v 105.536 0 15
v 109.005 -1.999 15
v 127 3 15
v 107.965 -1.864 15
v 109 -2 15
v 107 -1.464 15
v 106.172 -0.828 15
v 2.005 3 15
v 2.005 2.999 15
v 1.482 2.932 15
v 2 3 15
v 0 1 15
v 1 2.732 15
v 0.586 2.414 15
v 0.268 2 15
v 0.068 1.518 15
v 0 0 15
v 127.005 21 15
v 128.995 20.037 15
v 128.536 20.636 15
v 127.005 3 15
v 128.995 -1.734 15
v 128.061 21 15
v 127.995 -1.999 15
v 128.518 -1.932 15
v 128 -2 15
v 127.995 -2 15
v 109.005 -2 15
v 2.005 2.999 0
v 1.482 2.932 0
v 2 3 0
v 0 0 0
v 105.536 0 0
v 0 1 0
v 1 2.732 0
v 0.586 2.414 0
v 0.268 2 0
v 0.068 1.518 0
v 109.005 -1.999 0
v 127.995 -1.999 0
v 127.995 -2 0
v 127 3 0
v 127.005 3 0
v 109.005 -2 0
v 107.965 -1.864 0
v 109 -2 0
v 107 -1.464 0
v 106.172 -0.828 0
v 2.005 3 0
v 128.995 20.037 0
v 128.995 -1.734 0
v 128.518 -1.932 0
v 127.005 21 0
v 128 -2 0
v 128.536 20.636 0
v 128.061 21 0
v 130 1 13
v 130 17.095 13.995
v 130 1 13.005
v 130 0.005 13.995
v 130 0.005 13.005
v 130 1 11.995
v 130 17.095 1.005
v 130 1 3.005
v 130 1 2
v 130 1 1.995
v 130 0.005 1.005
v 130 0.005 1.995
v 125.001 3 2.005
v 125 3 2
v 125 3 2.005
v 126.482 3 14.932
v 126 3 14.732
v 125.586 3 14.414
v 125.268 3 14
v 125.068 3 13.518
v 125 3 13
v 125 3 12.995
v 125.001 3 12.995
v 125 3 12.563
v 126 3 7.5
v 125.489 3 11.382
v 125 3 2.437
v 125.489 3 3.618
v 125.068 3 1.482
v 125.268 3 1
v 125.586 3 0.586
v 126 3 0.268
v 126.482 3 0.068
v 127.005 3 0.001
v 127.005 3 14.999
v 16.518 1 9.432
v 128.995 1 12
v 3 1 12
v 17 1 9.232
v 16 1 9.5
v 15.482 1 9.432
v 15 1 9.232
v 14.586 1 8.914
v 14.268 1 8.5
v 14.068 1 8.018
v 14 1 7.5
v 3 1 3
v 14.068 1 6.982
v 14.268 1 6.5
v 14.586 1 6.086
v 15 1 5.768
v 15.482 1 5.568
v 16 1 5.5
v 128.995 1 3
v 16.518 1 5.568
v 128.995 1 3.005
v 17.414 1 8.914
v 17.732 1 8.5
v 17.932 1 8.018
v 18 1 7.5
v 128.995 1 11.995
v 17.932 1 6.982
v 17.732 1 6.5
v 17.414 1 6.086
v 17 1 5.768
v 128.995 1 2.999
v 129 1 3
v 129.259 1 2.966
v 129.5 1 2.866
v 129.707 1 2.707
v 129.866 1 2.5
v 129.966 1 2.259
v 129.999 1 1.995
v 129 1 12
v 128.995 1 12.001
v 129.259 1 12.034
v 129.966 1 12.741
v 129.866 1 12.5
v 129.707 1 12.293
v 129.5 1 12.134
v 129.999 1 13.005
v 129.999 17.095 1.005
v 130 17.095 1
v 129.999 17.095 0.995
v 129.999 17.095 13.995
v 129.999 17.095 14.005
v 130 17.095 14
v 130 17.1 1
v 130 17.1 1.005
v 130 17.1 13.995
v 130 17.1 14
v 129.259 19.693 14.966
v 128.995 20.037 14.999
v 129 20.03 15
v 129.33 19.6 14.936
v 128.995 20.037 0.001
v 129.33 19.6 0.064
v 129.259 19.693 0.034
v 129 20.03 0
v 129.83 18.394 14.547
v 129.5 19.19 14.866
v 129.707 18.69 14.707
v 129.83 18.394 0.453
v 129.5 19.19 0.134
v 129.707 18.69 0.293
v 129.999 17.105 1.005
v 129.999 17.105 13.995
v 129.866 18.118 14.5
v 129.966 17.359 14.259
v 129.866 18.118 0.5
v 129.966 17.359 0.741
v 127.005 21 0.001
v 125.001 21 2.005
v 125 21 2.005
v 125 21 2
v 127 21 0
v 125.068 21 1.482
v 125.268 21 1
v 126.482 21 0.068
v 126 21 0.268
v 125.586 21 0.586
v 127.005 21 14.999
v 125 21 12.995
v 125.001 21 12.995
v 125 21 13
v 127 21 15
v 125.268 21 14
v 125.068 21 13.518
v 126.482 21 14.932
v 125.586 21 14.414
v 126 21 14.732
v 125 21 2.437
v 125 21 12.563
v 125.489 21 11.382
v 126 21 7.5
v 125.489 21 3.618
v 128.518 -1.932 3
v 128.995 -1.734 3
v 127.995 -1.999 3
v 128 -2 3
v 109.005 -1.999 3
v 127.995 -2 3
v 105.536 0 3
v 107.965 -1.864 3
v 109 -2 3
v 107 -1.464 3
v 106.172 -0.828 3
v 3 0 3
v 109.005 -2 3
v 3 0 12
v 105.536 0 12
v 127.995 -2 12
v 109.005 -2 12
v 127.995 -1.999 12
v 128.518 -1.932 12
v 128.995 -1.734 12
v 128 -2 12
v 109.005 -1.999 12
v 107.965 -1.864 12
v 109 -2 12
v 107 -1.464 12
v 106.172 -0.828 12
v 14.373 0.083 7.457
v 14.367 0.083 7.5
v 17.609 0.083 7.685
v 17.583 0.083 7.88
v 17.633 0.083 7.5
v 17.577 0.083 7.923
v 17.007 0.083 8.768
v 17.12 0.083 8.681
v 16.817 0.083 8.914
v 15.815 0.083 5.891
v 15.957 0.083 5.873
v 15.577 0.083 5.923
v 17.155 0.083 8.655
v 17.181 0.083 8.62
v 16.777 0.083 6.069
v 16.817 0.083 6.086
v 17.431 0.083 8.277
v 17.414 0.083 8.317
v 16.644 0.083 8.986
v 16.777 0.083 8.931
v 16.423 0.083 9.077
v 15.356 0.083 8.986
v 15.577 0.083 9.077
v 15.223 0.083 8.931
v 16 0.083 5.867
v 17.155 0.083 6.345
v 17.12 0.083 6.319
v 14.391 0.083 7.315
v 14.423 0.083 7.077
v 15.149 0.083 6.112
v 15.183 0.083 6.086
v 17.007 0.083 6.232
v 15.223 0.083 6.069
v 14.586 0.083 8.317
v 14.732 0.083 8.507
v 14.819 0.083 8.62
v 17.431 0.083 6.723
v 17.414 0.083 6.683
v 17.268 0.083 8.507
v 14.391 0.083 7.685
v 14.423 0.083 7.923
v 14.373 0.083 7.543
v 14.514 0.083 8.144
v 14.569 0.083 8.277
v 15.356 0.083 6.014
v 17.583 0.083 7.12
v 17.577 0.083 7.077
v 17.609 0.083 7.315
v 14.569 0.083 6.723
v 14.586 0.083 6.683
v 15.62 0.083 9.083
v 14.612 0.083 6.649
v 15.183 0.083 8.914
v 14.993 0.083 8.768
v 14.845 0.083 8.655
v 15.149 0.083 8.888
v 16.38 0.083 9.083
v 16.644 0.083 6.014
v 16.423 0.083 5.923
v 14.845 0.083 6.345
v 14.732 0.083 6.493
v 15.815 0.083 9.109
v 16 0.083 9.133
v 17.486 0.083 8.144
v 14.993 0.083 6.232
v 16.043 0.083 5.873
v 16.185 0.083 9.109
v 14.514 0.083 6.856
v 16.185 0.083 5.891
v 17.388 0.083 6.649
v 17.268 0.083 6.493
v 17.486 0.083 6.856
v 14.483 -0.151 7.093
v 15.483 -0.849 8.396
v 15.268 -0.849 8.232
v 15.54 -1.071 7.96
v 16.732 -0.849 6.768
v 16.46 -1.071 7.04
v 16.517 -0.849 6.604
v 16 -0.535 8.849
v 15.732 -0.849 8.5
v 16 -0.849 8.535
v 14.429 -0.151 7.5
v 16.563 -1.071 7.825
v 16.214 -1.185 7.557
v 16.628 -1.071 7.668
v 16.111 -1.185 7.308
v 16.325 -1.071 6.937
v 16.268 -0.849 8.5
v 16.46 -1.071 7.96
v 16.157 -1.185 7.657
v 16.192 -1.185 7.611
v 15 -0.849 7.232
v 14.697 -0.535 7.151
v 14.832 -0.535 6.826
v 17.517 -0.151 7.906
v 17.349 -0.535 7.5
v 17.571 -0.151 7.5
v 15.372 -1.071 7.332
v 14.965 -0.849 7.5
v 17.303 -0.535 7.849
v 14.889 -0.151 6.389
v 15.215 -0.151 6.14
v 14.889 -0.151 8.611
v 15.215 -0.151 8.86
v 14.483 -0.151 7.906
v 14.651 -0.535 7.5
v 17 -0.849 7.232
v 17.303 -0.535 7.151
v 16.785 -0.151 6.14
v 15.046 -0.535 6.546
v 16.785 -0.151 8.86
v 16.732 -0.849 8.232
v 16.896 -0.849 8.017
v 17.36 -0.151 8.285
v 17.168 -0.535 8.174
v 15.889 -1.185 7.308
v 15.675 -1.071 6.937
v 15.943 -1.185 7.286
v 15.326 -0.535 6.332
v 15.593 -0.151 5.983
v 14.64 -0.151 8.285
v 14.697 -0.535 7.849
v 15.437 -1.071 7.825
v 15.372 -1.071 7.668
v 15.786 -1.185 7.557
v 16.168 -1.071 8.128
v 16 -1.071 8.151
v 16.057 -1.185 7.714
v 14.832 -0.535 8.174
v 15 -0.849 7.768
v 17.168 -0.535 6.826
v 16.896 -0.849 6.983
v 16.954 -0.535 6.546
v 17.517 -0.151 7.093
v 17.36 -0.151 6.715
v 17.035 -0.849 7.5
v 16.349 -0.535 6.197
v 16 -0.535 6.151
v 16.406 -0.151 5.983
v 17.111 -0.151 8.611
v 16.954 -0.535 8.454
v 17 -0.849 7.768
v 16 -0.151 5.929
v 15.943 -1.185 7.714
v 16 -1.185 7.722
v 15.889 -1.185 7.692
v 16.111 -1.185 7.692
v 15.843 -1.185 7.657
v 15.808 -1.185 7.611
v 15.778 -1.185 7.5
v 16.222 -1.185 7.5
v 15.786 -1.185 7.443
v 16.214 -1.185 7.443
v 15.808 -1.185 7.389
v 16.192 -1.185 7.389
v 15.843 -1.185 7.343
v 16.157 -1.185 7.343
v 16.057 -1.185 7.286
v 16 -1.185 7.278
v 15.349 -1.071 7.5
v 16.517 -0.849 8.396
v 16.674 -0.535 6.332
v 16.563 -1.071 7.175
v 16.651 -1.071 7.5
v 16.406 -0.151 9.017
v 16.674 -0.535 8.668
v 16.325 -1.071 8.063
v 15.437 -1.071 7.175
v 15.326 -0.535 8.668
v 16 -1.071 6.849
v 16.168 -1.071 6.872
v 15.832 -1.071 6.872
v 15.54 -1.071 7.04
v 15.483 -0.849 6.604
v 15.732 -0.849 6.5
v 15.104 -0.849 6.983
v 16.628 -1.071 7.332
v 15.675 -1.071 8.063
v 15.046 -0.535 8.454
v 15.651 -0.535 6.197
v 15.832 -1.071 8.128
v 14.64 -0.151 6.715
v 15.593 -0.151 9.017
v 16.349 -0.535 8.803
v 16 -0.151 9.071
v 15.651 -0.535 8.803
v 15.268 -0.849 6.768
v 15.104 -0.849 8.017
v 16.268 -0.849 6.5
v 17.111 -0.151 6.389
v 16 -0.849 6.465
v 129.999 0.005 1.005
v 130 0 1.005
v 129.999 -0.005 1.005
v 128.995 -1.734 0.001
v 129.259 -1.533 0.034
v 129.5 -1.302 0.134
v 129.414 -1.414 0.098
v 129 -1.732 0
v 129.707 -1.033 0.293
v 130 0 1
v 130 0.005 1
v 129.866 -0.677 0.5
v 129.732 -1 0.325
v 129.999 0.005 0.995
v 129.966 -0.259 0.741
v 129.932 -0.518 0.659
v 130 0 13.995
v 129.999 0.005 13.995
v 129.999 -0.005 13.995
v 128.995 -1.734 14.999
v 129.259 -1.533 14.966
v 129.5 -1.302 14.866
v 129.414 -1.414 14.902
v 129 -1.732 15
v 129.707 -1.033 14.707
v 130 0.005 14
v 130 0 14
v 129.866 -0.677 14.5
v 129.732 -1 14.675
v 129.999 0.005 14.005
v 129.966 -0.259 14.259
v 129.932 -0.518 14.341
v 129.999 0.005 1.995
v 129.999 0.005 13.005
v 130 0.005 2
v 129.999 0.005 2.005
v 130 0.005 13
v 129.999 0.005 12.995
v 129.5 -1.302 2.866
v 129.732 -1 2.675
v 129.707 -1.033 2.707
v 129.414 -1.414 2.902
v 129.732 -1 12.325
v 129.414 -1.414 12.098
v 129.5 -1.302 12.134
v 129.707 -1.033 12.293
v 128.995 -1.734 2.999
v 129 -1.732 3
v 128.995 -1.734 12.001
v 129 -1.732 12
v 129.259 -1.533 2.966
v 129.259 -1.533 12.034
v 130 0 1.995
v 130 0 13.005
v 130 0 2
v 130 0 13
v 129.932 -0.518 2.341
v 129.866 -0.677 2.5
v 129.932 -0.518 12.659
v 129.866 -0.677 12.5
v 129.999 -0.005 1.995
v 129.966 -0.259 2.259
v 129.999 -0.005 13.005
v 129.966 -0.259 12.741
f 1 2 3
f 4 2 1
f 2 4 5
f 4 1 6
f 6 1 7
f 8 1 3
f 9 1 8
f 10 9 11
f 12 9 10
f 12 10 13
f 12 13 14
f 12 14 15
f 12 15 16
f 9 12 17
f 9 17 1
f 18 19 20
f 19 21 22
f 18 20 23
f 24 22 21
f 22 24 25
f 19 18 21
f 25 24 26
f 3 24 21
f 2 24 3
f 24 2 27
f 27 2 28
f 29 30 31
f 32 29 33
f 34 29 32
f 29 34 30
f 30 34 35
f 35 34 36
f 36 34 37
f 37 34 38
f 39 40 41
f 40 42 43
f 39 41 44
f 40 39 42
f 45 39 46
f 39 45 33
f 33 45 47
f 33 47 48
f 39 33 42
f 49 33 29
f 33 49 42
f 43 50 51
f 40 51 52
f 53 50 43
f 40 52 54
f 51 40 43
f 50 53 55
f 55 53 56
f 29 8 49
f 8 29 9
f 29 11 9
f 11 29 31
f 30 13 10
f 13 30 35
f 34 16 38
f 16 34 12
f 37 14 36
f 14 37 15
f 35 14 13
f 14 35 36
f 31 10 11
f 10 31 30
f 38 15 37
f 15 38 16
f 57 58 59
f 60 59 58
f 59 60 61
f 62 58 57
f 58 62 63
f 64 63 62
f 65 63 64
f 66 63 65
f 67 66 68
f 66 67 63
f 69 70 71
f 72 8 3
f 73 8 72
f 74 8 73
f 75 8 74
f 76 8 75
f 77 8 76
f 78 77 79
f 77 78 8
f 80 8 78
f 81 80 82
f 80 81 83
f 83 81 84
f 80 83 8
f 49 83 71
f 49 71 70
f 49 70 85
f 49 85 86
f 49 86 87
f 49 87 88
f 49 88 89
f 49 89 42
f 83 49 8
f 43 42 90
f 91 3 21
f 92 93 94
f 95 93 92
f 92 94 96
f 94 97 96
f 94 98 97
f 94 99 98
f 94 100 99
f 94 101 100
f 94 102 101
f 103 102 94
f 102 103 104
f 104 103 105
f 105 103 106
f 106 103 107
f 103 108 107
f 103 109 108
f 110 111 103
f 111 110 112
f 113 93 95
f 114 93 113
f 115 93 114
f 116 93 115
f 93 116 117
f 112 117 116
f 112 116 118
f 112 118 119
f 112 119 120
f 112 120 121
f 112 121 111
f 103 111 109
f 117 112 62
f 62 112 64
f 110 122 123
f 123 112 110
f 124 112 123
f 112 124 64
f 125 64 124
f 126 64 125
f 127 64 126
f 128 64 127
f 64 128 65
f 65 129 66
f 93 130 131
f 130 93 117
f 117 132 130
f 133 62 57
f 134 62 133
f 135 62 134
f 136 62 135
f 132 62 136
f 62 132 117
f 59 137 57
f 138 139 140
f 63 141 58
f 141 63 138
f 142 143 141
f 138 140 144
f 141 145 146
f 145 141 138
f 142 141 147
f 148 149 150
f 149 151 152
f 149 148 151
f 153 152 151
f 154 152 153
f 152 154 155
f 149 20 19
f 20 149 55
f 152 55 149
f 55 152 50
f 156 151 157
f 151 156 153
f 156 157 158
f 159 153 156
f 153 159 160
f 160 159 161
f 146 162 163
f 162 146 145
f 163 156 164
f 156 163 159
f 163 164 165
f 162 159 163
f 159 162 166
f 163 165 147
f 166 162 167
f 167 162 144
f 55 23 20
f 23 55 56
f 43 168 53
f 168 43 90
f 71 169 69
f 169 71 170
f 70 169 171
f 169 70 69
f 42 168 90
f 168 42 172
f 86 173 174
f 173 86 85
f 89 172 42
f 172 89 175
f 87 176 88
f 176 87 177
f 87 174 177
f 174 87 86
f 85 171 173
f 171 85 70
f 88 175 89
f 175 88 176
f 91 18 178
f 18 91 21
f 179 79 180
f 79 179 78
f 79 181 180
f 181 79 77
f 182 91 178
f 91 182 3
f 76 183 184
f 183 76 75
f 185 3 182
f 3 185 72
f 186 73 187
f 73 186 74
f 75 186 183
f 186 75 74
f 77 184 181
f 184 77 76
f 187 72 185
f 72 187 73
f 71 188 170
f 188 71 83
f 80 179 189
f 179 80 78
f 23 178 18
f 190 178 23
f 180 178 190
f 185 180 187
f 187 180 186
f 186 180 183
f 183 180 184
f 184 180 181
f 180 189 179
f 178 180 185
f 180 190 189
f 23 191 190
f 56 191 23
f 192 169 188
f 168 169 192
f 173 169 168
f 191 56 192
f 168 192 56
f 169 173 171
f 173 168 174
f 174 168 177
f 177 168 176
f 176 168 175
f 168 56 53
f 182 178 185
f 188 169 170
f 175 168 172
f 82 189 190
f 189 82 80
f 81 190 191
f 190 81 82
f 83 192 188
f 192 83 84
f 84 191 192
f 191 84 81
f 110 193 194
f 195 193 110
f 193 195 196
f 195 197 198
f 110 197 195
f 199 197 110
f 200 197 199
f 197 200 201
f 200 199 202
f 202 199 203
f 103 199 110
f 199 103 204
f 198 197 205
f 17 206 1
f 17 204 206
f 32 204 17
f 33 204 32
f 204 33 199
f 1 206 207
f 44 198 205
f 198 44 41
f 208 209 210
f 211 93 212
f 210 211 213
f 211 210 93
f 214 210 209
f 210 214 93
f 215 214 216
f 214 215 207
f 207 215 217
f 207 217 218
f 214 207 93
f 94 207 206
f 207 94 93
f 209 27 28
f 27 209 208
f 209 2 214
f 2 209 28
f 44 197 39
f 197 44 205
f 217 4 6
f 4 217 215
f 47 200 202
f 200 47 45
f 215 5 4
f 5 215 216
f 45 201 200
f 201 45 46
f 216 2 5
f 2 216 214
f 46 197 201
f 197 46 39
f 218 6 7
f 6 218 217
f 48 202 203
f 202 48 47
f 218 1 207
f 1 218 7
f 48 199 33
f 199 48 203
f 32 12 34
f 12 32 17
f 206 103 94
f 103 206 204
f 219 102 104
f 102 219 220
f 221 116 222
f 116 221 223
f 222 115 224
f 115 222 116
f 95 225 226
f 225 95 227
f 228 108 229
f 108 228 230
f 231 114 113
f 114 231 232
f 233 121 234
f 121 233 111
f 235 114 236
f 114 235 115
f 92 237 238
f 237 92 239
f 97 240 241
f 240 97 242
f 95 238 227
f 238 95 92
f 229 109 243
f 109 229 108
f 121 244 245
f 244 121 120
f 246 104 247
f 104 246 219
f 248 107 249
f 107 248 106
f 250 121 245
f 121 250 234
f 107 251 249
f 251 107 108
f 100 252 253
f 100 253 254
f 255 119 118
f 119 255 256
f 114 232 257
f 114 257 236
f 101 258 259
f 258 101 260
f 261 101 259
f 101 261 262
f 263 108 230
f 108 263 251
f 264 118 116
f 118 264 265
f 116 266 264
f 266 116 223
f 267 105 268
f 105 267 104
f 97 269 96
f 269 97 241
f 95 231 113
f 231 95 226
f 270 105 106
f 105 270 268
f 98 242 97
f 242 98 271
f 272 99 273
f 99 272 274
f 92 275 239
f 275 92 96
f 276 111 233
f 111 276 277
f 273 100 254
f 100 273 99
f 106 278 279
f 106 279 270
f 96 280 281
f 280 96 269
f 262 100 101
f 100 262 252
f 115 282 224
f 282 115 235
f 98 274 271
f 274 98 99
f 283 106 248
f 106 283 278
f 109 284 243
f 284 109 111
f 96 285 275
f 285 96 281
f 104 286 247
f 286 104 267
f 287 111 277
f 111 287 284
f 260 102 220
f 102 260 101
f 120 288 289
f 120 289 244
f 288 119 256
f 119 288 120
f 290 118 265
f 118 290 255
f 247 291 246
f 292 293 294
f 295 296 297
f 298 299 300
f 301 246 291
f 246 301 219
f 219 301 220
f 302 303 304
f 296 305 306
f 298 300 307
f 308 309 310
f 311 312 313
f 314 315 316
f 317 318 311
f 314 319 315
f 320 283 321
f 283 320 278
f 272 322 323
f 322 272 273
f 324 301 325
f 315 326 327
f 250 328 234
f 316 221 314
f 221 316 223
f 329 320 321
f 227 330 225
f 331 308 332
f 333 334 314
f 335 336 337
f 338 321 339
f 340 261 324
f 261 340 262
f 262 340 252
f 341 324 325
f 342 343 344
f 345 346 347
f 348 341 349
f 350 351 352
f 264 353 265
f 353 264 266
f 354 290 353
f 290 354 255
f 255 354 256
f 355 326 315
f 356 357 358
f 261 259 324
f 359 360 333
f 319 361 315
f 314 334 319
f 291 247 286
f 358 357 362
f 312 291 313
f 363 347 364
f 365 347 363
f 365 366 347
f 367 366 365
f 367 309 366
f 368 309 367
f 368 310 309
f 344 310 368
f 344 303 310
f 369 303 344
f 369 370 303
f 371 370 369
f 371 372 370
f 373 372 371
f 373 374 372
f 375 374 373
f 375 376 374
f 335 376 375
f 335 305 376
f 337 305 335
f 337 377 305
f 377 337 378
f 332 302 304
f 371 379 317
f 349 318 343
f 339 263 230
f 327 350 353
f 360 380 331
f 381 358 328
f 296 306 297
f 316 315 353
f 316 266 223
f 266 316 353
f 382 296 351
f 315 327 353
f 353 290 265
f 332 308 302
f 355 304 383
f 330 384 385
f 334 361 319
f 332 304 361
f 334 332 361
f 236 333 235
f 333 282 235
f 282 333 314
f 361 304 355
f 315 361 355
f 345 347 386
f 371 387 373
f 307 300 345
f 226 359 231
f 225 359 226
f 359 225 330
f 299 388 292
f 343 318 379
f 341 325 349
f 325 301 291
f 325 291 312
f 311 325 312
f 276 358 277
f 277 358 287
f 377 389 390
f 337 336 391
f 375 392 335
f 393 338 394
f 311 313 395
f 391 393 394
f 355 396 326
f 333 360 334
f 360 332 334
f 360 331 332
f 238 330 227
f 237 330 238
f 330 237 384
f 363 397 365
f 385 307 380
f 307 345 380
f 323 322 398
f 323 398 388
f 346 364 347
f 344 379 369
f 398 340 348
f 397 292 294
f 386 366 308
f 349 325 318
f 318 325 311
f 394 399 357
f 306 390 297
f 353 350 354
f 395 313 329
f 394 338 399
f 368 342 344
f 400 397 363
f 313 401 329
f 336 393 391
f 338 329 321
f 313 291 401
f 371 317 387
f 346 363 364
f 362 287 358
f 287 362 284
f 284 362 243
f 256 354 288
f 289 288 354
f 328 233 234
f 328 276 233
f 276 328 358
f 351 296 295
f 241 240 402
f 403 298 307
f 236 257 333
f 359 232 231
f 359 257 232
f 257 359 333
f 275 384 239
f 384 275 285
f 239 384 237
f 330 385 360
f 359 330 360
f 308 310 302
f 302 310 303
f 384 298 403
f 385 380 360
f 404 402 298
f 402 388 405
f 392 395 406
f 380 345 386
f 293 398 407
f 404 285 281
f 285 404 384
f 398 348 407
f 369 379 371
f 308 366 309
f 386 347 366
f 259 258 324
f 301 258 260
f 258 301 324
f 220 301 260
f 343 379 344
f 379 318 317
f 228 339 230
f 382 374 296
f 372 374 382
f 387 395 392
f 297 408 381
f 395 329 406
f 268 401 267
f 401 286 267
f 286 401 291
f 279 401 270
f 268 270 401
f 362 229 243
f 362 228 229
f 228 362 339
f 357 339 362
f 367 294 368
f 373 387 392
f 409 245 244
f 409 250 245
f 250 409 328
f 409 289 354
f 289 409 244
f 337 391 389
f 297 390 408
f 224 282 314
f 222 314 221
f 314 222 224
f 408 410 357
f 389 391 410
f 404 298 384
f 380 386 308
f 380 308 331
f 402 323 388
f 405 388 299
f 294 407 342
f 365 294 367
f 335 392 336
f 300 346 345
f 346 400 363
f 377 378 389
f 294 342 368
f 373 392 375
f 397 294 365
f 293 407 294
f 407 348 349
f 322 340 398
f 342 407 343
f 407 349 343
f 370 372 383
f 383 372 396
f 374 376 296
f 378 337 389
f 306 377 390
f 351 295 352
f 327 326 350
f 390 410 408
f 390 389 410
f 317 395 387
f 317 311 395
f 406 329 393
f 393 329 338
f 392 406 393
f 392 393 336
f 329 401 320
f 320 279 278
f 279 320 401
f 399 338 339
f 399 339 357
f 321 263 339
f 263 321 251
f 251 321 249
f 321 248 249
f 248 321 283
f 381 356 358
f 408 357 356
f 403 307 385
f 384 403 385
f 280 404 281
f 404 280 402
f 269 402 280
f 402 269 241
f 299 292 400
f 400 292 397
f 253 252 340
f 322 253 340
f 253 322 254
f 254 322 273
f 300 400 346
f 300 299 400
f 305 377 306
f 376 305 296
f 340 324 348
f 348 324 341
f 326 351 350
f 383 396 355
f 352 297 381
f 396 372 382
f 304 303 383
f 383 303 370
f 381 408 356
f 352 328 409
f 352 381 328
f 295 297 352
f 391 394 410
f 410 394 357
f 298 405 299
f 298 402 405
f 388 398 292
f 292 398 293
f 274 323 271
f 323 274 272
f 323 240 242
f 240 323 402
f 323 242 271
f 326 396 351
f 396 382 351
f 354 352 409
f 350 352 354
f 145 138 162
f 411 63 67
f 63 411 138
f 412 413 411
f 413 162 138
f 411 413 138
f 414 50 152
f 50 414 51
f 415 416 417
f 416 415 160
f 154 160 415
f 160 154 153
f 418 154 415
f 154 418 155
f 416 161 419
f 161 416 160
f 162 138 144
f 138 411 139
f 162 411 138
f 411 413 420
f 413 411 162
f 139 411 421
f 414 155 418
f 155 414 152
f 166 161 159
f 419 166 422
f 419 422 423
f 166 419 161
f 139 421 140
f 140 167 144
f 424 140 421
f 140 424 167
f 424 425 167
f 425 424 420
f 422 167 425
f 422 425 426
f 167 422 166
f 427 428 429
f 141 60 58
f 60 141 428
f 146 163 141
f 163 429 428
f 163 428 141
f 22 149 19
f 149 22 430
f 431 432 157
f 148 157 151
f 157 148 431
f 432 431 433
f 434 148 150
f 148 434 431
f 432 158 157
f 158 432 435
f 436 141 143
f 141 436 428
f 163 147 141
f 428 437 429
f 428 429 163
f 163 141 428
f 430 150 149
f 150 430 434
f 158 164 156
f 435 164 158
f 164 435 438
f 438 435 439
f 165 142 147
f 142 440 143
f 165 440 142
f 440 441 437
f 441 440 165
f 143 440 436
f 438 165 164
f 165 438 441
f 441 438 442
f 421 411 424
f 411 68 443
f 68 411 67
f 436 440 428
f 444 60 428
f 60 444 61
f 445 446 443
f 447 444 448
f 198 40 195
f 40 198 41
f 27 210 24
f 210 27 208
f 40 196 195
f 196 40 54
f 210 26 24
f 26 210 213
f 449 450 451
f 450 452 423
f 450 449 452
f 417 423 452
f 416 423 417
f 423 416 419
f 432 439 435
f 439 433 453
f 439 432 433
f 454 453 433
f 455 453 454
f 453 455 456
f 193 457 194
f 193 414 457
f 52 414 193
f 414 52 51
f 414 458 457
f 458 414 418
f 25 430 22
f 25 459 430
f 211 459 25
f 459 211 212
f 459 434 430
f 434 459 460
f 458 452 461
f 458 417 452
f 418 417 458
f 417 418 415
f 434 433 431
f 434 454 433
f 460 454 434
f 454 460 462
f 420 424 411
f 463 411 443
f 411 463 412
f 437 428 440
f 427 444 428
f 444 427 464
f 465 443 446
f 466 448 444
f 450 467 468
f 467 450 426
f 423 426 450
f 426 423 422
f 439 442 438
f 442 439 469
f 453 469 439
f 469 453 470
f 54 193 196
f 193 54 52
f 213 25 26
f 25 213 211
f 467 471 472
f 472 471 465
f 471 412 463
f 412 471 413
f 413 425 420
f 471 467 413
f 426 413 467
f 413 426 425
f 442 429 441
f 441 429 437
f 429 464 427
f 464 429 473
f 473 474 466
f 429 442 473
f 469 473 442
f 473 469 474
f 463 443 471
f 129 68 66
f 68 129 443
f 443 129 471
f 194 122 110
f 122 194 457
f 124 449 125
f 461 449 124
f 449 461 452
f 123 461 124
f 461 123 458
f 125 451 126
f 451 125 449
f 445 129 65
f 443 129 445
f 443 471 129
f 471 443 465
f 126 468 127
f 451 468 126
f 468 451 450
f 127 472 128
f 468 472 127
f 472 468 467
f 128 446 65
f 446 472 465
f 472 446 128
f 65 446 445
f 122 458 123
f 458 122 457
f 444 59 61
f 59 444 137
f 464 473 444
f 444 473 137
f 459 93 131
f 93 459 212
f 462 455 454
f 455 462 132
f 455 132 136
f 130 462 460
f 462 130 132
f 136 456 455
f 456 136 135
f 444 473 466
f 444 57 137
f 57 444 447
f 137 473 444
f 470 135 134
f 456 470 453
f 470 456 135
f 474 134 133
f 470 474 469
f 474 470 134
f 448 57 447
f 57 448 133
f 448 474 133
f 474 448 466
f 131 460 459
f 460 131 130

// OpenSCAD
// papier-op-de-goede-plek-houd-ding voor gaatjes-maak-ding
//  Based on http://www.thingiverse.com/thing:831545
// Updated by NPO 03-2017

$fn=24;

Width = 15; 
Lenght = 130; 


module fillet(r, h) { // thanks to nop_head
    translate([r / 2, r / 2, 0])

        difference() {
            cube([r + 0.01, r + 0.01, h], center = true);

            translate([r/2, r/2, 0])
                cylinder(r = r, h = h + 1, center = true);

        }
}


// use # to highlight parts
difference(){
union(){

translate([0,1,0])   difference(){ 
    cube([Lenght,2,Width]);
    translate([0,2,Width/2]) rotate([0,0,-90]) fillet(2,Width);

}
translate([125,1,0]) difference(){
    cube ([5,20,Width]);
    translate([-Width+1,Width+6,Width/2]) rotate([90,0,0]) cylinder(h=Width+5,r=Width);
	translate([5,21.1,Width/2]) rotate([0,0,180]) fillet(5,Width);
	translate([0,12,0]) rotate([90,0,0]) fillet(2,Width+5);
	translate([0,12,Width]) rotate([-90,0,0]) fillet(2,Width+5);
}

translate([0,0,0])  cube([Lenght,1,3]);
    translate([0,0,Width-3]) cube([Lenght,1,3]);
	

difference(){
	union(){
	translate([105,-2,0])  cube([25,2,3]);
	translate([105,-2,Width-3]) cube([25,2,3]);
		}
translate([105,-2,Width/2]) rotate([0,0,0]) fillet(4,Width);
}
cube([3,1,Width]);

translate([16,1,Width/2]) rotate([90,0,0]) cylinder(h=1,r=2, r2=1.6);
translate([16,0.5,Width/2]) rotate([90,0,0]) sphere(1.7);

}
	translate([Lenght,10,0]) rotate([90,-90,0]) fillet(1,30);
    translate([Lenght,10,Width]) rotate([-90,90,0]) fillet(1,30);
    translate([Lenght,-2,(Width+2)/2]) rotate([0,0,90]) fillet(2,Width+2);
  	translate([Lenght,-0.5,3]) rotate([-90,90,0]) fillet(1,3);
    translate([Lenght,-0.5,Width-3]) rotate([90,-90,0]) fillet(1,3);
}



*translate([0,1,0]) rotate([90,0,0]) fillet(2,4);
